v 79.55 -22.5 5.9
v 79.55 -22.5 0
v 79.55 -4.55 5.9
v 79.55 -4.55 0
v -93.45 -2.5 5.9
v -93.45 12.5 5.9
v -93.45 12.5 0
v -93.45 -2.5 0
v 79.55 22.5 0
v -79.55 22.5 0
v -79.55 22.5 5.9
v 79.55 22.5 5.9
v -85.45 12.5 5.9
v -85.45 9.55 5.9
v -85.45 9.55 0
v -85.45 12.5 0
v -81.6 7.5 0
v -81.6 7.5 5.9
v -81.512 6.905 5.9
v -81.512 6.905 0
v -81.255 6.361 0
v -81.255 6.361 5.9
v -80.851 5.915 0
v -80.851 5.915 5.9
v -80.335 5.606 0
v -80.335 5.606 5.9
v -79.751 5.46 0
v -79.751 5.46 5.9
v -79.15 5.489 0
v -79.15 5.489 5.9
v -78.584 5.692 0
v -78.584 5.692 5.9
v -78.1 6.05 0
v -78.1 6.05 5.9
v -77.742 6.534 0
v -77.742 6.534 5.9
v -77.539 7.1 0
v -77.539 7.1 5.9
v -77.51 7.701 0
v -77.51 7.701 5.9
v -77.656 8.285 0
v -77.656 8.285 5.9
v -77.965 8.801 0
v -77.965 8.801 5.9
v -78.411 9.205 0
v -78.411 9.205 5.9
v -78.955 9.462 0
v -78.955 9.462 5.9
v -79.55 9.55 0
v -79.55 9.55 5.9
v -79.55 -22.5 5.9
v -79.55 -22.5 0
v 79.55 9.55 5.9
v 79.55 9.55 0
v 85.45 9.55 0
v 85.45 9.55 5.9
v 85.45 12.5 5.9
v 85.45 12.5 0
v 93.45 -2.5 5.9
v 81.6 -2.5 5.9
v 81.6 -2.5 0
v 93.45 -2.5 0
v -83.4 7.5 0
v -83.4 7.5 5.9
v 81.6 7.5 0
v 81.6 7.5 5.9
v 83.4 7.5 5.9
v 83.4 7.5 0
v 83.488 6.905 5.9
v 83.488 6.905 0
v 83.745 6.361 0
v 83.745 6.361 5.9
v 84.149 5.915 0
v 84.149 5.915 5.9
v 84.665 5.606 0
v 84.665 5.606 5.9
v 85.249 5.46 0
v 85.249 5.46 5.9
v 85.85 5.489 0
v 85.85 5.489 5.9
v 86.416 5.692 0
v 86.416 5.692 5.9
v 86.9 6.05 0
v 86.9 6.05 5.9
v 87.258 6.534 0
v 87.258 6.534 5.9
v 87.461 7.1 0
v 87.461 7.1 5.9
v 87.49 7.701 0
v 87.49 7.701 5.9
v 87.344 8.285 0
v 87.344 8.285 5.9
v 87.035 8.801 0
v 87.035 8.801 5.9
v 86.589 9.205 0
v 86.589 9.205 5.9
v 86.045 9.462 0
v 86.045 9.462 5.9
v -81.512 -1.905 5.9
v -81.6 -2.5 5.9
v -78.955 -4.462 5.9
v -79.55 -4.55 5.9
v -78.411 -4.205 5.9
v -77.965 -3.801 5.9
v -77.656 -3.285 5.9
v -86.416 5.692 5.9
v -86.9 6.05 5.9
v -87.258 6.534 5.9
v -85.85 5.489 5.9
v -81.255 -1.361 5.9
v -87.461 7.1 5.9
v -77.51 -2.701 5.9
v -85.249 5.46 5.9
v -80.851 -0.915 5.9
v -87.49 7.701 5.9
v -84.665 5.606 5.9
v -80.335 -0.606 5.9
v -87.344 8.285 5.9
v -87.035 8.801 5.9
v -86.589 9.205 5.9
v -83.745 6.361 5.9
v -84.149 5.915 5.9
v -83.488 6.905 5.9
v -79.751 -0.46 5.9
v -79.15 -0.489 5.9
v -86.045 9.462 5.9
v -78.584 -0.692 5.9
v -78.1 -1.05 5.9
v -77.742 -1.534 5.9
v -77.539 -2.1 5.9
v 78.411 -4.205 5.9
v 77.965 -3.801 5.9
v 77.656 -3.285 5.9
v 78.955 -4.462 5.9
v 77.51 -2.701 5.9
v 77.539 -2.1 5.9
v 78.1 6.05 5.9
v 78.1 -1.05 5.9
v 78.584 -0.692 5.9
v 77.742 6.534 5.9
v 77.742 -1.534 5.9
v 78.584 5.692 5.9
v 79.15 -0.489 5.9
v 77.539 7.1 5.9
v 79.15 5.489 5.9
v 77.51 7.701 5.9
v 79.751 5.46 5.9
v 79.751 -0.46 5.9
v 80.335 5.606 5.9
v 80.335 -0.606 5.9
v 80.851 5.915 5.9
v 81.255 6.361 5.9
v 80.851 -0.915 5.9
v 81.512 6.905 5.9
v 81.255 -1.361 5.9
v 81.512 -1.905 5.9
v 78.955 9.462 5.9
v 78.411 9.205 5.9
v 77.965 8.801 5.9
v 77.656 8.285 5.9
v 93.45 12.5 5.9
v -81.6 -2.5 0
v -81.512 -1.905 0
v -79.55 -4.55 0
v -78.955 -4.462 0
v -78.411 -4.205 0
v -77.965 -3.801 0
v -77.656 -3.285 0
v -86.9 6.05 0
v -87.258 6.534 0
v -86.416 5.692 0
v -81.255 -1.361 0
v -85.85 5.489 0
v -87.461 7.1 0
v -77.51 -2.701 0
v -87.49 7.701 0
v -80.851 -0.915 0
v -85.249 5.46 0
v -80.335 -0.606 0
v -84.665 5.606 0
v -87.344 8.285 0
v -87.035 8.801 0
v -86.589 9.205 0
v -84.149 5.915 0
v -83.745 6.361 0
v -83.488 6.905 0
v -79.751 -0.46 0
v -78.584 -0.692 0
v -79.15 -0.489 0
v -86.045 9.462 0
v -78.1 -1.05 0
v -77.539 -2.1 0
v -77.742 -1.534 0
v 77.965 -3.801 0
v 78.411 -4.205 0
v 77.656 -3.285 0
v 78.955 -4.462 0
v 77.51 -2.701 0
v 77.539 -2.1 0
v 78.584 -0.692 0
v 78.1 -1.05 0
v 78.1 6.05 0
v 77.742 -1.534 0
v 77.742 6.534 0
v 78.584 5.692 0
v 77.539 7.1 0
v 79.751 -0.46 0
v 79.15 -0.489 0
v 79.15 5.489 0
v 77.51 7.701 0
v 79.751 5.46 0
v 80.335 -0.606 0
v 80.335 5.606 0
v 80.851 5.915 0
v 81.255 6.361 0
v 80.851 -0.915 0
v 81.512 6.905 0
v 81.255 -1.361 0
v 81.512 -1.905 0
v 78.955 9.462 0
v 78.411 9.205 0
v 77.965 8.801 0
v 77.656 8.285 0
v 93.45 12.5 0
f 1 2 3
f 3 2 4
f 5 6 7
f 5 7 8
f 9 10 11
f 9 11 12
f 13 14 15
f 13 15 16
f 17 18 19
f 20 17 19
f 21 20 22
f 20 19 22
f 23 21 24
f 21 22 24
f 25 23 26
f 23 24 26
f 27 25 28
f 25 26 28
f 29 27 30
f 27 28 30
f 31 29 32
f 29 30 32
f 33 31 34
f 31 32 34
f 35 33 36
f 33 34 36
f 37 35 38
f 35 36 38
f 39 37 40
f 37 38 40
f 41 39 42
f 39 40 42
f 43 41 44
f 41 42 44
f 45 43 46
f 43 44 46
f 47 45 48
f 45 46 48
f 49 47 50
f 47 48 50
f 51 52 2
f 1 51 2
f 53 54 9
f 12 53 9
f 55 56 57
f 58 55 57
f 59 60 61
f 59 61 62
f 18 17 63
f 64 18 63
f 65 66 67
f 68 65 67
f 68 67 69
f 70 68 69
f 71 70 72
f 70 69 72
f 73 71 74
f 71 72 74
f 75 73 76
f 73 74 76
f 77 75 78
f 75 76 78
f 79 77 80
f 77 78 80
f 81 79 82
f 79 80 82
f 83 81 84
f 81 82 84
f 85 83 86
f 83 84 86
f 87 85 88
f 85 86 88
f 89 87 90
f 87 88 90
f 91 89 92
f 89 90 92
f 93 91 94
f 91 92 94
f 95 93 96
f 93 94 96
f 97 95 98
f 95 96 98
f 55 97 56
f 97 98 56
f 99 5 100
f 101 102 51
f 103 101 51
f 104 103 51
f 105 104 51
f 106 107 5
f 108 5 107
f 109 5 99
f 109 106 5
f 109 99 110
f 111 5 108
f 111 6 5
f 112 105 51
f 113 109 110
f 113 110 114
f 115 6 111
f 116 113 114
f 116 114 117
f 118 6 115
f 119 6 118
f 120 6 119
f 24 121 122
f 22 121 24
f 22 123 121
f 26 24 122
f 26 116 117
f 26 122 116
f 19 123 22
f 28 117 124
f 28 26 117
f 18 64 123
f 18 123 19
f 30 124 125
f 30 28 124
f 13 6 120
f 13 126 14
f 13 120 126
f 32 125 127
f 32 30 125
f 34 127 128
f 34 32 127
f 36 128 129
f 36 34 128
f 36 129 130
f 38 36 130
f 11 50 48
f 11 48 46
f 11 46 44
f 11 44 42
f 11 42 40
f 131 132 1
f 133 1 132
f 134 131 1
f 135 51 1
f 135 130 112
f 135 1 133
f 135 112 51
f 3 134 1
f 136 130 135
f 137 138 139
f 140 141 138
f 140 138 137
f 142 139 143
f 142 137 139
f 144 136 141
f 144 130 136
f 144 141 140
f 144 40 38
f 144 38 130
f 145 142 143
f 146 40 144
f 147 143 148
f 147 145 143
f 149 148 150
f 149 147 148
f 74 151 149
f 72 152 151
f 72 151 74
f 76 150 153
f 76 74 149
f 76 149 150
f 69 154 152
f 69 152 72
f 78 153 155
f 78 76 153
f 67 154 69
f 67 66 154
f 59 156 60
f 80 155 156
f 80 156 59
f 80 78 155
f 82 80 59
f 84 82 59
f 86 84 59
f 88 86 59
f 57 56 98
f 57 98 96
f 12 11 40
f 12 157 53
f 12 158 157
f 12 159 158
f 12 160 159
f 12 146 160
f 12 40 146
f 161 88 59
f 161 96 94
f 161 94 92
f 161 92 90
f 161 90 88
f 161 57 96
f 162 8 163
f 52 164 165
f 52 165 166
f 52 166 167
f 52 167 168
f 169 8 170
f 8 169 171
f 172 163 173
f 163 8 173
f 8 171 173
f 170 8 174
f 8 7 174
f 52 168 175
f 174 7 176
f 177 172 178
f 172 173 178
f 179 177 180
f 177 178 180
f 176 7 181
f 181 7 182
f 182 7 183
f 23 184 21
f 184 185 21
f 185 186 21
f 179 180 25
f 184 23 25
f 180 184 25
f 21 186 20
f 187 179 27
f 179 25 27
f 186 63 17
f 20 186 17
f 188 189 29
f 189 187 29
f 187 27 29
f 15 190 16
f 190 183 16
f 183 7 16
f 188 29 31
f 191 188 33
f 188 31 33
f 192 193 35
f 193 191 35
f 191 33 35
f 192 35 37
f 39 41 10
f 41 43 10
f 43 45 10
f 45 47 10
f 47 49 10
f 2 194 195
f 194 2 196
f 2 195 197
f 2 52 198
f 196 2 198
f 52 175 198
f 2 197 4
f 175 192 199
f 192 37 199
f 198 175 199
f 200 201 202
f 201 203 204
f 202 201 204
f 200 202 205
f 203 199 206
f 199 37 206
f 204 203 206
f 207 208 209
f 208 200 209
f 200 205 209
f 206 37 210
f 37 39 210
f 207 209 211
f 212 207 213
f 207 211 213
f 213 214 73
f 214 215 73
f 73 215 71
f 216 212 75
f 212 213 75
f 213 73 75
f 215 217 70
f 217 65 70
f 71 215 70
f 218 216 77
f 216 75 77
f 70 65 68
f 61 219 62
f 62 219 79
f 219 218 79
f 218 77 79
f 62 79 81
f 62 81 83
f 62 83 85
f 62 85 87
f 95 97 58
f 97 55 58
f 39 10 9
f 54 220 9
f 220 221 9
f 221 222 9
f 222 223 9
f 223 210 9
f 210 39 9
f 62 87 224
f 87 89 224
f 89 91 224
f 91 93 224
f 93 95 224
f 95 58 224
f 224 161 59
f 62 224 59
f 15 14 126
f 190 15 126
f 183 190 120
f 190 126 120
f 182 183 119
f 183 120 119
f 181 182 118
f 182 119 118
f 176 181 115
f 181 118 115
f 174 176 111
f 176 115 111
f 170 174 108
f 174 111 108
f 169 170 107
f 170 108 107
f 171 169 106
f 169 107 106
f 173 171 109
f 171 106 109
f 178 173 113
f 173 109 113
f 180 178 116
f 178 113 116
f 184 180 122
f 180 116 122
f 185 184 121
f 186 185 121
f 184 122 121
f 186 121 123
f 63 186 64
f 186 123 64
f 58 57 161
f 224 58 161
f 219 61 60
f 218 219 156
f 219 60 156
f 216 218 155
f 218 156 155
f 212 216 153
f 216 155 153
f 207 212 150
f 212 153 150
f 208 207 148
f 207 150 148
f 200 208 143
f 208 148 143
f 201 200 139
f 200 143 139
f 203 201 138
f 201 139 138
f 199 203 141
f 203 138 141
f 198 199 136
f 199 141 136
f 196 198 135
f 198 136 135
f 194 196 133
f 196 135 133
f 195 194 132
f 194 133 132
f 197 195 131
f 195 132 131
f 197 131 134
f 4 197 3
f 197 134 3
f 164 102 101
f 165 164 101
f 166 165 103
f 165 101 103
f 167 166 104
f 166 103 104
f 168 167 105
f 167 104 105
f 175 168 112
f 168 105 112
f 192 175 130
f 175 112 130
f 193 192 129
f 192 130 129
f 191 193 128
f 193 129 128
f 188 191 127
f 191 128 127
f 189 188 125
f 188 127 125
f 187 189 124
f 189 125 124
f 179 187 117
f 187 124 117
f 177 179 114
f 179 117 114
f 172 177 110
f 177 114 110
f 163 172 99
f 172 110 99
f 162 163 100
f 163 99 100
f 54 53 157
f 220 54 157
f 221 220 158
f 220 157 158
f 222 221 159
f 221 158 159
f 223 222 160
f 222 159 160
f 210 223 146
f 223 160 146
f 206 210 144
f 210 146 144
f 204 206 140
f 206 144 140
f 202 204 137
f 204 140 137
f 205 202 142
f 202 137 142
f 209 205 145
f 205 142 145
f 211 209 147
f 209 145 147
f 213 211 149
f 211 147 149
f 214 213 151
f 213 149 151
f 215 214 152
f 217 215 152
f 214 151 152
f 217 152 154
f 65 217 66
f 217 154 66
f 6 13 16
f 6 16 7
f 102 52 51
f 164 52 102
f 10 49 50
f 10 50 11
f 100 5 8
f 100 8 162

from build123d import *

# Parameters (mm, degrees)
SKETCH1_W           = 159.1
SKETCH1_H           = 45
BOSS_EXTRUDE1_DEPTH = 5.9
BOSS_EXTRUDE3_DEPTH = 5.9
CUT_EXTRUDE1_REACH  = 7.9
SKETCH4_R           = 2.05


with BuildPart() as part:
    # Sketch1 → Boss-Extrude1 (new body)
    with BuildSketch(Plane.XY):
        Rectangle(SKETCH1_W, SKETCH1_H)
    extrude(amount=BOSS_EXTRUDE1_DEPTH)

    # Sketch3 → Boss-Extrude3 (add)
    with BuildSketch(Plane.XY.offset(5.9)):
        Polygon((-79.55, 7.5), (-85.45, 7.5), (-85.45, 12.5), (-93.45, 12.5), (-93.45, -2.5), (-85.45, -2.5), (-79.55, -2.5), align=None)
        Polygon((79.55, -2.5), (79.55, 7.5), (85.45, 7.5), (85.45, 12.5), (93.45, 12.5), (93.45, -2.5), (85.45, -2.5), align=None)
    extrude(amount=-BOSS_EXTRUDE3_DEPTH)

    # Sketch4 → Cut-Extrude1 (cut, up to next)
    with BuildSketch(Plane.XY.offset(5.9), mode=Mode.PRIVATE) as cut_extrude1_sk1:
        with Locations((-79.55, 7.5)):
            Circle(SKETCH4_R)
    cut_extrude1_tool1 = extrude(cut_extrude1_sk1.sketch, amount=-CUT_EXTRUDE1_REACH, mode=Mode.PRIVATE) & part.part
    add(cut_extrude1_tool1.solids().sort_by_distance((-79.55, 7.5, 5.9))[0], mode=Mode.SUBTRACT)
    # Sketch4 → Cut-Extrude1 (cut, up to next)
    with BuildSketch(Plane.XY.offset(5.9), mode=Mode.PRIVATE) as cut_extrude1_sk2:
        with Locations((-79.55, -2.5)):
            Circle(SKETCH4_R)
    cut_extrude1_tool2 = extrude(cut_extrude1_sk2.sketch, amount=-CUT_EXTRUDE1_REACH, mode=Mode.PRIVATE) & part.part
    add(cut_extrude1_tool2.solids().sort_by_distance((-79.55, -2.5, 5.9))[0], mode=Mode.SUBTRACT)
    # Sketch4 → Cut-Extrude1 (cut, up to next)
    with BuildSketch(Plane.XY.offset(5.9), mode=Mode.PRIVATE) as cut_extrude1_sk3:
        with Locations((79.55, -2.5)):
            Circle(SKETCH4_R)
    cut_extrude1_tool3 = extrude(cut_extrude1_sk3.sketch, amount=-CUT_EXTRUDE1_REACH, mode=Mode.PRIVATE) & part.part
    add(cut_extrude1_tool3.solids().sort_by_distance((79.55, -2.5, 5.9))[0], mode=Mode.SUBTRACT)
    # Sketch4 → Cut-Extrude1 (cut, up to next)
    with BuildSketch(Plane.XY.offset(5.9), mode=Mode.PRIVATE) as cut_extrude1_sk4:
        with Locations((79.55, 7.5)):
            Circle(SKETCH4_R)
    cut_extrude1_tool4 = extrude(cut_extrude1_sk4.sketch, amount=-CUT_EXTRUDE1_REACH, mode=Mode.PRIVATE) & part.part
    add(cut_extrude1_tool4.solids().sort_by_distance((79.55, 7.5, 5.9))[0], mode=Mode.SUBTRACT)
    # Sketch4 → Cut-Extrude1 (cut, up to next)
    with BuildSketch(Plane.XY.offset(5.9), mode=Mode.PRIVATE) as cut_extrude1_sk5:
        with Locations((-85.45, 7.5)):
            Circle(SKETCH4_R)
    cut_extrude1_tool5 = extrude(cut_extrude1_sk5.sketch, amount=-CUT_EXTRUDE1_REACH, mode=Mode.PRIVATE) & part.part
    add(cut_extrude1_tool5.solids().sort_by_distance((-85.45, 7.5, 5.9))[0], mode=Mode.SUBTRACT)
    # Sketch4 → Cut-Extrude1 (cut, up to next)
    with BuildSketch(Plane.XY.offset(5.9), mode=Mode.PRIVATE) as cut_extrude1_sk6:
        with Locations((85.45, 7.5)):
            Circle(SKETCH4_R)
    cut_extrude1_tool6 = extrude(cut_extrude1_sk6.sketch, amount=-CUT_EXTRUDE1_REACH, mode=Mode.PRIVATE) & part.part
    add(cut_extrude1_tool6.solids().sort_by_distance((85.45, 7.5, 5.9))[0], mode=Mode.SUBTRACT)


solid = part.part
